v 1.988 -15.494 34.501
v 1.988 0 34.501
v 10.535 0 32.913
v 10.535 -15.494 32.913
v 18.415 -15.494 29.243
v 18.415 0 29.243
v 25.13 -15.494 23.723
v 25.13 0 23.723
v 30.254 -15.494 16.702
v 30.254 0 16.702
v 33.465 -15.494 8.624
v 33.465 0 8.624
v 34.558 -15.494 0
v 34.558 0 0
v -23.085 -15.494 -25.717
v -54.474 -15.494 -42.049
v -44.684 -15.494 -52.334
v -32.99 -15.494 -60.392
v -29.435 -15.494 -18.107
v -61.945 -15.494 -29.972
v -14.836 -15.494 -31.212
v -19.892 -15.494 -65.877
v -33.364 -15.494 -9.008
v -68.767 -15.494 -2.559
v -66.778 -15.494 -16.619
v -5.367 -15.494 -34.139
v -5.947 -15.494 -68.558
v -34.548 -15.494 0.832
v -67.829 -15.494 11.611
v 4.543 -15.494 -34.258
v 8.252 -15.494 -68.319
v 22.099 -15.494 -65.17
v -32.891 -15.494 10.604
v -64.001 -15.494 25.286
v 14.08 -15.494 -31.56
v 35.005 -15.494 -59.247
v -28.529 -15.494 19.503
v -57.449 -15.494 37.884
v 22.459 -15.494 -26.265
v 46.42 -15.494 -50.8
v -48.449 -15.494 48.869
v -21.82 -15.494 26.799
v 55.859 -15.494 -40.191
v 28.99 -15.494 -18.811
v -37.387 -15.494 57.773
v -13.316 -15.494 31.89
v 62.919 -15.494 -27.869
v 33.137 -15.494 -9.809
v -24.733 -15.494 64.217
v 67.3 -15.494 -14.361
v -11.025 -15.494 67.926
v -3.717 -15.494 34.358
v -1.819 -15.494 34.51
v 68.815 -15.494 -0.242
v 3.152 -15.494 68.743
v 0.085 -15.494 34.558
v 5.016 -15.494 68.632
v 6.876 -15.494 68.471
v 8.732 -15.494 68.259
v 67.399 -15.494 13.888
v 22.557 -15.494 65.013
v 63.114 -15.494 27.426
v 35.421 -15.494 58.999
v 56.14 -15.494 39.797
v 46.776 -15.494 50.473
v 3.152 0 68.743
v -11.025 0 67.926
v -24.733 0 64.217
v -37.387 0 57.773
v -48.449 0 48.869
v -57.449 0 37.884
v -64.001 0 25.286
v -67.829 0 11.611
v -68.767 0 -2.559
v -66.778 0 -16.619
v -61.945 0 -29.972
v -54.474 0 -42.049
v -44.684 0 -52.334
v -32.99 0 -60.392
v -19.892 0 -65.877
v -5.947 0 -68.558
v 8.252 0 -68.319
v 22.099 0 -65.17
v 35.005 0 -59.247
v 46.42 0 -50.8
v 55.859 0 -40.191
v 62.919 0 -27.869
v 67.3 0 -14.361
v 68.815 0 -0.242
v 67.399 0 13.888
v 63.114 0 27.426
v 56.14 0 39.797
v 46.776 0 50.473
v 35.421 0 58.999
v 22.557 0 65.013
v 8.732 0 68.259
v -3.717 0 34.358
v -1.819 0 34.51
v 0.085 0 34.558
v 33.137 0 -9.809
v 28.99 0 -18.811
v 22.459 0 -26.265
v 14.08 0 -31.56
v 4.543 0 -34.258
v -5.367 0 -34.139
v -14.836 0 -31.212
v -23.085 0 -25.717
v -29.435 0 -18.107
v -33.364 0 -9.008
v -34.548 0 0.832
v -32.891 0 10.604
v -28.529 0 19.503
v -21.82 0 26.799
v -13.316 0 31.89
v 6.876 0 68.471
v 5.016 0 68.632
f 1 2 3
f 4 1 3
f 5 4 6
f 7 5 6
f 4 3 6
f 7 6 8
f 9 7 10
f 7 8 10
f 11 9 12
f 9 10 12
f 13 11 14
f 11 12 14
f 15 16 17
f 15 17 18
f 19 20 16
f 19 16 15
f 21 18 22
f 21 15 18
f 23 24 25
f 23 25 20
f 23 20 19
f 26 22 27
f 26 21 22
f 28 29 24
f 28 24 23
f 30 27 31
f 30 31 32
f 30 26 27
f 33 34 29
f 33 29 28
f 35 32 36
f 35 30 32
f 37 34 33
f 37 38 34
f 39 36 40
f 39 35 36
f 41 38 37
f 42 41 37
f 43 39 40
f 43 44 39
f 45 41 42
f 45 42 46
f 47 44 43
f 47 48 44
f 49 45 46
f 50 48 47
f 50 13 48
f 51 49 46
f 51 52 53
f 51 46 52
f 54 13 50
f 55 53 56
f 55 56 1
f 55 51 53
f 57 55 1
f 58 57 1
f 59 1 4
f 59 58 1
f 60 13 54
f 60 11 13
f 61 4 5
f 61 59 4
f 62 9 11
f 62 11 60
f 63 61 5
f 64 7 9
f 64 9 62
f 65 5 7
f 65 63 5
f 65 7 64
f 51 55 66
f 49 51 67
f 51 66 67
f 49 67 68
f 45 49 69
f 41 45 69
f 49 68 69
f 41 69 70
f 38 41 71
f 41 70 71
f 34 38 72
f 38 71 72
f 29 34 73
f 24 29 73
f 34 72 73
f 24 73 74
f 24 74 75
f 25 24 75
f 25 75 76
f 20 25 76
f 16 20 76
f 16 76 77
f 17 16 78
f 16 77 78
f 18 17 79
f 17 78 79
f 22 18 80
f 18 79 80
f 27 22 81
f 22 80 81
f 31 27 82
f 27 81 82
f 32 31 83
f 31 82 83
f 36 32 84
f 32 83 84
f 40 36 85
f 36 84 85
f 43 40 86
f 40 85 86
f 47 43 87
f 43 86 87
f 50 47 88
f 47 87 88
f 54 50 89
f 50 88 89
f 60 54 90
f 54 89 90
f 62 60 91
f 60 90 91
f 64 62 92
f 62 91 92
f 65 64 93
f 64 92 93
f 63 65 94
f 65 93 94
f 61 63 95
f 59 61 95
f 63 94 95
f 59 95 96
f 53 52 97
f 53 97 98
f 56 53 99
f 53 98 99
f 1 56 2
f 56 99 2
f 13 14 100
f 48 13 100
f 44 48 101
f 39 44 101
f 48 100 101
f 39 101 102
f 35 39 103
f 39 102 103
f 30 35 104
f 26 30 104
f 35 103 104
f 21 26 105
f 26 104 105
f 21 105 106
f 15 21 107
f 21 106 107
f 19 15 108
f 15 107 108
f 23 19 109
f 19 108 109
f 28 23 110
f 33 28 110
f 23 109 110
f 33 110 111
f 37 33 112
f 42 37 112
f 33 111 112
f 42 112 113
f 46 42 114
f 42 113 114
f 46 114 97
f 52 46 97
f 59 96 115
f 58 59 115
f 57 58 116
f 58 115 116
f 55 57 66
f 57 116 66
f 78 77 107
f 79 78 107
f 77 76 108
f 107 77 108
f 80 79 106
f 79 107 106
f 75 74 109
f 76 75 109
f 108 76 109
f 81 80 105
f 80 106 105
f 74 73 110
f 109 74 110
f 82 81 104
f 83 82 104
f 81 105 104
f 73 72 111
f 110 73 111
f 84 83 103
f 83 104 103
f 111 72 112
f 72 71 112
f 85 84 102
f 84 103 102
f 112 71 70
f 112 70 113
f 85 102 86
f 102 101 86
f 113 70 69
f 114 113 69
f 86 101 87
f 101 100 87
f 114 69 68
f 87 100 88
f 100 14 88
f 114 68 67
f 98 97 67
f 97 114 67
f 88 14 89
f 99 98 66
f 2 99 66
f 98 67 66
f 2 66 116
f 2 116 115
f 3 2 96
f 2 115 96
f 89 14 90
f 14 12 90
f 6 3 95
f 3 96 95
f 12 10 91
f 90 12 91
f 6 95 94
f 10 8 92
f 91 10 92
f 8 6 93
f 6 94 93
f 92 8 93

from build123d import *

# Parameters (mm, degrees)
F1_DEPTH = 15.494


# Not quite as in the source:
# - the program builds the solid bodies; features that only make, move or delete a surface that nothing else refers to are left out


with BuildPart() as f1:
    # F0 (on Front) → F1 (new body)
    with BuildSketch(Plane.XZ):
        with BuildLine():
            Line((1.9883703665, 34.5010177122), (8.7319990578, 68.2588214835))
            ThreePointArc((8.7319990578, 68.2588214835), (5.9467168888, 68.5576478309), (3.1515805748, 68.742869141))
            Line((3.1515805748, 68.742869141), (-3.7173636083, 34.3577509115))
            ThreePointArc((-3.7173636083, 34.3577509115), (-0.867459366, 34.5473783975), (1.9883703665, 34.5010177122))
        make_face()
        with BuildLine():
            ThreePointArc((3.1515805748, 68.742869141), (-49.7613844804, -47.5322956783), (68.8150747864, 0))
            ThreePointArc((68.8150747864, 0), (51.6546594513, 45.4676882503), (8.7319990578, 68.2588214835))
            Line((8.7319990578, 68.2588214835), (1.9883703665, 34.5010177122))
            ThreePointArc((1.9883703665, 34.5010177122), (25.1295490861, 23.7229762598), (34.5582673161, 0))
            ThreePointArc((34.5582673161, 0), (-23.0847156643, -25.717109919), (-3.7173636083, 34.3577509115))
            Line((-3.7173636083, 34.3577509115), (3.1515805748, 68.742869141))
        make_face()
    extrude(amount=F1_DEPTH)


solid = f1.part
